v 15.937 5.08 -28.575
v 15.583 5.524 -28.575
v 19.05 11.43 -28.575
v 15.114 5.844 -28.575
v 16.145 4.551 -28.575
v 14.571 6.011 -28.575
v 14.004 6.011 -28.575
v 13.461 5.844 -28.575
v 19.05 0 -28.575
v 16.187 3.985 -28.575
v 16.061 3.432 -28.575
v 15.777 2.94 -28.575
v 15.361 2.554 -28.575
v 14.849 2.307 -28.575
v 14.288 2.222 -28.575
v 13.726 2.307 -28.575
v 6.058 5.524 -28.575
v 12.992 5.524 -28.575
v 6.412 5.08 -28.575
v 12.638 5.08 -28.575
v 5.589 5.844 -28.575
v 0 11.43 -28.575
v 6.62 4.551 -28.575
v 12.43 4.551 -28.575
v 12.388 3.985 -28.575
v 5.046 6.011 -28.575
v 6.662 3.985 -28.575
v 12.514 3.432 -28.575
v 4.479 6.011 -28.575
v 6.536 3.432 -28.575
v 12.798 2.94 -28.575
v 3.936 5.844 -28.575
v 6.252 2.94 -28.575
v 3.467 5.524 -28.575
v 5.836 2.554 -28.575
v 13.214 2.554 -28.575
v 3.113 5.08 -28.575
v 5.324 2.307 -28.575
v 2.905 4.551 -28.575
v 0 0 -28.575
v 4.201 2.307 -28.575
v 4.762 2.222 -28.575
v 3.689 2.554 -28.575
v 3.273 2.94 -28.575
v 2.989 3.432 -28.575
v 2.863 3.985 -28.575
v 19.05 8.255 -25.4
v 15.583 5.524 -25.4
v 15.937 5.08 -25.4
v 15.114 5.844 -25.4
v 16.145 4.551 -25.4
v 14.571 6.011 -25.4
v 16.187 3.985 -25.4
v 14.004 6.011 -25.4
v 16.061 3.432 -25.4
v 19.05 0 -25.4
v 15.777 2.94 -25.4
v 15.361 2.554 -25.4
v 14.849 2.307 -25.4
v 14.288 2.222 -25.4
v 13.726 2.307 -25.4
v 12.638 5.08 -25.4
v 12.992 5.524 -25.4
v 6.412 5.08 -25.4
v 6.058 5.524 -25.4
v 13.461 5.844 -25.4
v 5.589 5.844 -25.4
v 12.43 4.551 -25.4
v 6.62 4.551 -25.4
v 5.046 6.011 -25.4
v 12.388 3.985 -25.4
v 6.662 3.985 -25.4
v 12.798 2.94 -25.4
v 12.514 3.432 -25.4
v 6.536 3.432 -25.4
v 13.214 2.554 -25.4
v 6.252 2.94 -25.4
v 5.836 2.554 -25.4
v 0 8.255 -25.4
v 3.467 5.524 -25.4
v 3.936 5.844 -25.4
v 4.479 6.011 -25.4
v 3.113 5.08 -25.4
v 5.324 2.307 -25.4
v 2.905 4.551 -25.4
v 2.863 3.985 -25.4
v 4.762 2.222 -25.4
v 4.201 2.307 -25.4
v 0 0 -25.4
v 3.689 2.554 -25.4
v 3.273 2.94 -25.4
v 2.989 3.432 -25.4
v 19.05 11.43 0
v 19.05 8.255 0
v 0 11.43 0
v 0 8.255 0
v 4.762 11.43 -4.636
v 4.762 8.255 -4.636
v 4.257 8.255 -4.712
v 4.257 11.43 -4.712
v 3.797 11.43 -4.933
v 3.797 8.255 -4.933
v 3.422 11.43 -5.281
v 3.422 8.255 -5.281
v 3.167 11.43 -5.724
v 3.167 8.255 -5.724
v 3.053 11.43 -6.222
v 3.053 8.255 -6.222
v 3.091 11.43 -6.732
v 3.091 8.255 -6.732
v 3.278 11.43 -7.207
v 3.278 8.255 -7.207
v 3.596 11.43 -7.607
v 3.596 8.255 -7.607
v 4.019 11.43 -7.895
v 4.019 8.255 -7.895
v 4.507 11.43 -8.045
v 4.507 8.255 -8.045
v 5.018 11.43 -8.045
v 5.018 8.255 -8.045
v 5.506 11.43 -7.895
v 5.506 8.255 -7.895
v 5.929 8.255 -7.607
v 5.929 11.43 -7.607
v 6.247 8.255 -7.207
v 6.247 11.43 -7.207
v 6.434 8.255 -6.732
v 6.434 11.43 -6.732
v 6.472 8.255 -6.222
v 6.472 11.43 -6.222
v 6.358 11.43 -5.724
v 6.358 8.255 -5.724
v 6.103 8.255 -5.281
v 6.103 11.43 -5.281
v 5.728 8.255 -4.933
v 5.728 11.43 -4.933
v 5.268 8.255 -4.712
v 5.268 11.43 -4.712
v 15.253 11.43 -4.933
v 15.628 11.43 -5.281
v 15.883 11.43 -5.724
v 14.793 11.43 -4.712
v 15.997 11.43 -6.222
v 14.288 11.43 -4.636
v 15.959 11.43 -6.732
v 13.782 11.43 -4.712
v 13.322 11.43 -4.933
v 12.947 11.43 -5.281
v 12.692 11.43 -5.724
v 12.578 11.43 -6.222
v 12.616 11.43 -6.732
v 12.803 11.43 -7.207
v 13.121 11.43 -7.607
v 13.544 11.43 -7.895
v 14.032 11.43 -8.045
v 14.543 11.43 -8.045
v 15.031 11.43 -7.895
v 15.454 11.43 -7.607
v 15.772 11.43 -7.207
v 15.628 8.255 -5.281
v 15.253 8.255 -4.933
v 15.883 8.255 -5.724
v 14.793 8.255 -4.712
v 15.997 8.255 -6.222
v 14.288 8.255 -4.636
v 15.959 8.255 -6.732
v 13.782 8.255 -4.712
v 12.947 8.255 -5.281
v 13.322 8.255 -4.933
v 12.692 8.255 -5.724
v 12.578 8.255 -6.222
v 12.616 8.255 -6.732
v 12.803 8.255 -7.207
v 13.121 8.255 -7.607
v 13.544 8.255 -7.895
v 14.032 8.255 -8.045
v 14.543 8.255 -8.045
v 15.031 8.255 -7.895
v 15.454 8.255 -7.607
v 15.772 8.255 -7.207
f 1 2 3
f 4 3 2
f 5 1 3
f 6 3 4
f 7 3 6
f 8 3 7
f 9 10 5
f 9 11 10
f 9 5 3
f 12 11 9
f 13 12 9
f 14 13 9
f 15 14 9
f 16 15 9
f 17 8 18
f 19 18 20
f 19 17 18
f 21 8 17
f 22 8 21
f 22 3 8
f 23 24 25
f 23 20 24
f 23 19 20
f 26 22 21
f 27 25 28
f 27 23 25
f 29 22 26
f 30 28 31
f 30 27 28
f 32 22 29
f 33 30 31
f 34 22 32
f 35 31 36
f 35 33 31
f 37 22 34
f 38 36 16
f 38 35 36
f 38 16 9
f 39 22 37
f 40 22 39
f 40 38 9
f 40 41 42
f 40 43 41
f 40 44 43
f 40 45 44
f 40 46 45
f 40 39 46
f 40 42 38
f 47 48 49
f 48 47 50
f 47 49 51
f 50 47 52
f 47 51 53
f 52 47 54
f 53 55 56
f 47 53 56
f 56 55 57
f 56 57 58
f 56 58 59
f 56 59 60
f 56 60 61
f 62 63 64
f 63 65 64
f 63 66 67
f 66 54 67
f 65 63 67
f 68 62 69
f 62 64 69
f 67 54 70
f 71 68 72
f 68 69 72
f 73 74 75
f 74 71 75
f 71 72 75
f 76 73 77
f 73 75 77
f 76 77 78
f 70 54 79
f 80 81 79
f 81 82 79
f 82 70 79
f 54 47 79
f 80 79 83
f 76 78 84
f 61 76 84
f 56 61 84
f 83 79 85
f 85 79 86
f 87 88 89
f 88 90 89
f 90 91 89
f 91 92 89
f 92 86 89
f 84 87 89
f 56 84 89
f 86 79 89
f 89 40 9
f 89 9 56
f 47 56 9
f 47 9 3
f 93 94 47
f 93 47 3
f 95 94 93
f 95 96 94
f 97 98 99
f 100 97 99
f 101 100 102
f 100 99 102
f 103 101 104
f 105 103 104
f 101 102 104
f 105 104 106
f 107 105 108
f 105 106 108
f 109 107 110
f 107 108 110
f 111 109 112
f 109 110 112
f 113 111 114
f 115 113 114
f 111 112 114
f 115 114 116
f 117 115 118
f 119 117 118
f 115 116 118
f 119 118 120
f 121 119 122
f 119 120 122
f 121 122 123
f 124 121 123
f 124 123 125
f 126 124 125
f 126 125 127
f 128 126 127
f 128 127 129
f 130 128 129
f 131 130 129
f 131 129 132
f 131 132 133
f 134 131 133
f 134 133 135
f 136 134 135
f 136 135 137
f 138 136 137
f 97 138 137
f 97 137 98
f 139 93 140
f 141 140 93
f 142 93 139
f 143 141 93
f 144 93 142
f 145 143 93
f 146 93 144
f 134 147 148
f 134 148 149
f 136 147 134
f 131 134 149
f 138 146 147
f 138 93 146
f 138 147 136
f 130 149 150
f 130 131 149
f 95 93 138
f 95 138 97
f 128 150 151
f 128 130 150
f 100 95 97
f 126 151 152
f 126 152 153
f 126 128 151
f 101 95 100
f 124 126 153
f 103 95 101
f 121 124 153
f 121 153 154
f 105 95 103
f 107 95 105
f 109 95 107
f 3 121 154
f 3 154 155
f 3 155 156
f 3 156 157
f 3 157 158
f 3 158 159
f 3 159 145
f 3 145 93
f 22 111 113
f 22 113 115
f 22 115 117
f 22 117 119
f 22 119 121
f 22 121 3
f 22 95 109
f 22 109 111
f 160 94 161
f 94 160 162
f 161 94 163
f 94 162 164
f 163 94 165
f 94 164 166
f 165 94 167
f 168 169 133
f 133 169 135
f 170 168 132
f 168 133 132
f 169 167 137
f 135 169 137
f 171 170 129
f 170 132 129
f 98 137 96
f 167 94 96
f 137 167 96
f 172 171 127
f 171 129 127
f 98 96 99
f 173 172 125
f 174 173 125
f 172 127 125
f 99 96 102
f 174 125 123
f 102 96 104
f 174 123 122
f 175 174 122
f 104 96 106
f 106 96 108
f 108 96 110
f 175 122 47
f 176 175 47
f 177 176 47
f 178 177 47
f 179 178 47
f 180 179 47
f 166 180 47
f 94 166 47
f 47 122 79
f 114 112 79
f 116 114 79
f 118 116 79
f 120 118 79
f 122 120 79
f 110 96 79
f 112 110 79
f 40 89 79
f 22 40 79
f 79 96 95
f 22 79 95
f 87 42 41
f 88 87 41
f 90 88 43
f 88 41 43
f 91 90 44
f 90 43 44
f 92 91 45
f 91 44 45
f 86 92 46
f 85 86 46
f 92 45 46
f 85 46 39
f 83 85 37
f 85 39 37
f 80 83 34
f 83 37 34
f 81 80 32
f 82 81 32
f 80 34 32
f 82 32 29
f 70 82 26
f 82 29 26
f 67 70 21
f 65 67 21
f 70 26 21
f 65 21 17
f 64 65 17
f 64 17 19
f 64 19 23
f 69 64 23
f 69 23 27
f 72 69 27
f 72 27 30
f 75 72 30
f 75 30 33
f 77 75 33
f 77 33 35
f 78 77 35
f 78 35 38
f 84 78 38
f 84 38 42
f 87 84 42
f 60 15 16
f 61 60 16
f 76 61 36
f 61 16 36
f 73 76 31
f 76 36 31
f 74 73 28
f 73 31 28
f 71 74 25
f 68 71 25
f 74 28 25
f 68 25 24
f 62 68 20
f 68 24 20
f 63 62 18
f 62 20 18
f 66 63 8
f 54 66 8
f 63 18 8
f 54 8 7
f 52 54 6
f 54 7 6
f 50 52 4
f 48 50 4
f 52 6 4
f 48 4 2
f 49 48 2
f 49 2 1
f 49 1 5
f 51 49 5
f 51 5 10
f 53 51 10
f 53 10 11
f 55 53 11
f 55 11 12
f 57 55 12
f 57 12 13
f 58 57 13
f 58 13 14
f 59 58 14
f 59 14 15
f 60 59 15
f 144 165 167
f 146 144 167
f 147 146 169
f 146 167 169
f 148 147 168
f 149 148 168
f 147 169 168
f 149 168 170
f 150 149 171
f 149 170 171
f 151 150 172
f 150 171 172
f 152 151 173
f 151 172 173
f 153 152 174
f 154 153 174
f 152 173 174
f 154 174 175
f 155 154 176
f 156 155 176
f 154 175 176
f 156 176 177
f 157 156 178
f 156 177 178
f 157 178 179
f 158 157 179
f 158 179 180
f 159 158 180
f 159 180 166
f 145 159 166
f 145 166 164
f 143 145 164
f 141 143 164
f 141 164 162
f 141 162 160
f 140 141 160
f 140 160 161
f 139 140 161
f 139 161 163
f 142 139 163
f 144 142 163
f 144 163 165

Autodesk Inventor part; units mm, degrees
ref_plane "YZ Plane" through (0, 0, 0) normal (1, 0, 0) x (0, 1, 0)
ref_plane "XZ Plane" through (0, 0, 0) normal (0, 1, 0) x (-1, 0, 0)
ref_plane "XY Plane" through (0, 0, 0) normal (0, 0, 1) x (1, 0, 0)
sketch "Sketch1" plane through (0, 0, 0) normal (1, 0, 0) x (0, 1, 0)
  line L0 (0, 0) -> (11.43, 0)
  line L1 (11.43, 0) -> (11.43, -28.575)
  line L2 (11.43, -28.575) -> (0, -28.575)
  line L3 (0, -28.575) -> (0, 0)
  line L4 (0, 0) -> (8.255, 0)
  line L5 (8.255, 0) -> (8.255, -25.4)
  line L6 (8.255, -25.4) -> (0, -25.4)
  line L7 (0, -25.4) -> (0, 0)
  dimension "d0" = 11.43
  dimension "d1" = 28.575
  dimension "d2" = 8.255
  dimension "d3" = 25.4
extrude "Extrusion1" add sketch "Sketch1" along normal blind 19.05 contours L0 L1 L2 L3 L6 L5
sketch "Sketch2" plane through (0, 11.43, 0) normal (0, 1, 0) x (1, 0, 0)
  line L0 (0, 28.575) -> (0, 0) projected
  line L1 (0, 0) -> (19.05, 0) projected
  line L2 (19.05, 28.575) -> (19.05, 0) projected
  line L3 (0, 28.575) -> (19.05, 28.575) projected
  point P0 (0, 0)
  point P1 (4.7625, 6.35)
  point P2 (14.2875, 6.35)
  dimension "d6" = 9.525
  dimension "d7" = 4.7625
  dimension "d8" = 28.575
  dimension "d31" = 19.05
  dimension "d33" = 6.35
  dimension "d34" = 6.35
hole "Hole1" at (4.7625, 11.43, -6.35) at (14.2875, 11.43, -6.35) direction (0, -1, 0) diameter 3.429 end through all
sketch "Sketch3" plane through (0, 0, -25.4) normal (0, 0, 1) x (1, 0, 0)
  line L0 (0, 0) -> (0, 8.255) projected
  line L1 (19.05, 0) -> (0, 0) projected
  line L2 (19.05, 8.255) -> (19.05, 0) projected
  line L3 (0, 8.255) -> (19.05, 8.255) projected
  point P0 (0, 0)
  point P1 (4.7625, 4.1275)
  point P2 (14.2875, 4.1275)
  dimension "d20" = 9.525
  dimension "d21" = 4.7625
  dimension "d22" = 4.1275
  dimension "d23" = 4.1275
  dimension "d32" = 19.05
  dimension "d35" = 8.255
hole "Hole2" at (4.7625, 4.1275, -25.4) at (14.2875, 4.1275, -25.4) direction (0, 0, -1) diameter 3.81 end through all
equation "\"d7\" = -0.5 * d6 + 0.5 * d31"
equation "\"d21\" = -0.5 * d20 + 0.5 * d32"
equation "\"d22\" = 0.5 * d35"
equation "\"d23\" = d22"
properties part number "TensionerPlate4a" material "ABS Plastic"
